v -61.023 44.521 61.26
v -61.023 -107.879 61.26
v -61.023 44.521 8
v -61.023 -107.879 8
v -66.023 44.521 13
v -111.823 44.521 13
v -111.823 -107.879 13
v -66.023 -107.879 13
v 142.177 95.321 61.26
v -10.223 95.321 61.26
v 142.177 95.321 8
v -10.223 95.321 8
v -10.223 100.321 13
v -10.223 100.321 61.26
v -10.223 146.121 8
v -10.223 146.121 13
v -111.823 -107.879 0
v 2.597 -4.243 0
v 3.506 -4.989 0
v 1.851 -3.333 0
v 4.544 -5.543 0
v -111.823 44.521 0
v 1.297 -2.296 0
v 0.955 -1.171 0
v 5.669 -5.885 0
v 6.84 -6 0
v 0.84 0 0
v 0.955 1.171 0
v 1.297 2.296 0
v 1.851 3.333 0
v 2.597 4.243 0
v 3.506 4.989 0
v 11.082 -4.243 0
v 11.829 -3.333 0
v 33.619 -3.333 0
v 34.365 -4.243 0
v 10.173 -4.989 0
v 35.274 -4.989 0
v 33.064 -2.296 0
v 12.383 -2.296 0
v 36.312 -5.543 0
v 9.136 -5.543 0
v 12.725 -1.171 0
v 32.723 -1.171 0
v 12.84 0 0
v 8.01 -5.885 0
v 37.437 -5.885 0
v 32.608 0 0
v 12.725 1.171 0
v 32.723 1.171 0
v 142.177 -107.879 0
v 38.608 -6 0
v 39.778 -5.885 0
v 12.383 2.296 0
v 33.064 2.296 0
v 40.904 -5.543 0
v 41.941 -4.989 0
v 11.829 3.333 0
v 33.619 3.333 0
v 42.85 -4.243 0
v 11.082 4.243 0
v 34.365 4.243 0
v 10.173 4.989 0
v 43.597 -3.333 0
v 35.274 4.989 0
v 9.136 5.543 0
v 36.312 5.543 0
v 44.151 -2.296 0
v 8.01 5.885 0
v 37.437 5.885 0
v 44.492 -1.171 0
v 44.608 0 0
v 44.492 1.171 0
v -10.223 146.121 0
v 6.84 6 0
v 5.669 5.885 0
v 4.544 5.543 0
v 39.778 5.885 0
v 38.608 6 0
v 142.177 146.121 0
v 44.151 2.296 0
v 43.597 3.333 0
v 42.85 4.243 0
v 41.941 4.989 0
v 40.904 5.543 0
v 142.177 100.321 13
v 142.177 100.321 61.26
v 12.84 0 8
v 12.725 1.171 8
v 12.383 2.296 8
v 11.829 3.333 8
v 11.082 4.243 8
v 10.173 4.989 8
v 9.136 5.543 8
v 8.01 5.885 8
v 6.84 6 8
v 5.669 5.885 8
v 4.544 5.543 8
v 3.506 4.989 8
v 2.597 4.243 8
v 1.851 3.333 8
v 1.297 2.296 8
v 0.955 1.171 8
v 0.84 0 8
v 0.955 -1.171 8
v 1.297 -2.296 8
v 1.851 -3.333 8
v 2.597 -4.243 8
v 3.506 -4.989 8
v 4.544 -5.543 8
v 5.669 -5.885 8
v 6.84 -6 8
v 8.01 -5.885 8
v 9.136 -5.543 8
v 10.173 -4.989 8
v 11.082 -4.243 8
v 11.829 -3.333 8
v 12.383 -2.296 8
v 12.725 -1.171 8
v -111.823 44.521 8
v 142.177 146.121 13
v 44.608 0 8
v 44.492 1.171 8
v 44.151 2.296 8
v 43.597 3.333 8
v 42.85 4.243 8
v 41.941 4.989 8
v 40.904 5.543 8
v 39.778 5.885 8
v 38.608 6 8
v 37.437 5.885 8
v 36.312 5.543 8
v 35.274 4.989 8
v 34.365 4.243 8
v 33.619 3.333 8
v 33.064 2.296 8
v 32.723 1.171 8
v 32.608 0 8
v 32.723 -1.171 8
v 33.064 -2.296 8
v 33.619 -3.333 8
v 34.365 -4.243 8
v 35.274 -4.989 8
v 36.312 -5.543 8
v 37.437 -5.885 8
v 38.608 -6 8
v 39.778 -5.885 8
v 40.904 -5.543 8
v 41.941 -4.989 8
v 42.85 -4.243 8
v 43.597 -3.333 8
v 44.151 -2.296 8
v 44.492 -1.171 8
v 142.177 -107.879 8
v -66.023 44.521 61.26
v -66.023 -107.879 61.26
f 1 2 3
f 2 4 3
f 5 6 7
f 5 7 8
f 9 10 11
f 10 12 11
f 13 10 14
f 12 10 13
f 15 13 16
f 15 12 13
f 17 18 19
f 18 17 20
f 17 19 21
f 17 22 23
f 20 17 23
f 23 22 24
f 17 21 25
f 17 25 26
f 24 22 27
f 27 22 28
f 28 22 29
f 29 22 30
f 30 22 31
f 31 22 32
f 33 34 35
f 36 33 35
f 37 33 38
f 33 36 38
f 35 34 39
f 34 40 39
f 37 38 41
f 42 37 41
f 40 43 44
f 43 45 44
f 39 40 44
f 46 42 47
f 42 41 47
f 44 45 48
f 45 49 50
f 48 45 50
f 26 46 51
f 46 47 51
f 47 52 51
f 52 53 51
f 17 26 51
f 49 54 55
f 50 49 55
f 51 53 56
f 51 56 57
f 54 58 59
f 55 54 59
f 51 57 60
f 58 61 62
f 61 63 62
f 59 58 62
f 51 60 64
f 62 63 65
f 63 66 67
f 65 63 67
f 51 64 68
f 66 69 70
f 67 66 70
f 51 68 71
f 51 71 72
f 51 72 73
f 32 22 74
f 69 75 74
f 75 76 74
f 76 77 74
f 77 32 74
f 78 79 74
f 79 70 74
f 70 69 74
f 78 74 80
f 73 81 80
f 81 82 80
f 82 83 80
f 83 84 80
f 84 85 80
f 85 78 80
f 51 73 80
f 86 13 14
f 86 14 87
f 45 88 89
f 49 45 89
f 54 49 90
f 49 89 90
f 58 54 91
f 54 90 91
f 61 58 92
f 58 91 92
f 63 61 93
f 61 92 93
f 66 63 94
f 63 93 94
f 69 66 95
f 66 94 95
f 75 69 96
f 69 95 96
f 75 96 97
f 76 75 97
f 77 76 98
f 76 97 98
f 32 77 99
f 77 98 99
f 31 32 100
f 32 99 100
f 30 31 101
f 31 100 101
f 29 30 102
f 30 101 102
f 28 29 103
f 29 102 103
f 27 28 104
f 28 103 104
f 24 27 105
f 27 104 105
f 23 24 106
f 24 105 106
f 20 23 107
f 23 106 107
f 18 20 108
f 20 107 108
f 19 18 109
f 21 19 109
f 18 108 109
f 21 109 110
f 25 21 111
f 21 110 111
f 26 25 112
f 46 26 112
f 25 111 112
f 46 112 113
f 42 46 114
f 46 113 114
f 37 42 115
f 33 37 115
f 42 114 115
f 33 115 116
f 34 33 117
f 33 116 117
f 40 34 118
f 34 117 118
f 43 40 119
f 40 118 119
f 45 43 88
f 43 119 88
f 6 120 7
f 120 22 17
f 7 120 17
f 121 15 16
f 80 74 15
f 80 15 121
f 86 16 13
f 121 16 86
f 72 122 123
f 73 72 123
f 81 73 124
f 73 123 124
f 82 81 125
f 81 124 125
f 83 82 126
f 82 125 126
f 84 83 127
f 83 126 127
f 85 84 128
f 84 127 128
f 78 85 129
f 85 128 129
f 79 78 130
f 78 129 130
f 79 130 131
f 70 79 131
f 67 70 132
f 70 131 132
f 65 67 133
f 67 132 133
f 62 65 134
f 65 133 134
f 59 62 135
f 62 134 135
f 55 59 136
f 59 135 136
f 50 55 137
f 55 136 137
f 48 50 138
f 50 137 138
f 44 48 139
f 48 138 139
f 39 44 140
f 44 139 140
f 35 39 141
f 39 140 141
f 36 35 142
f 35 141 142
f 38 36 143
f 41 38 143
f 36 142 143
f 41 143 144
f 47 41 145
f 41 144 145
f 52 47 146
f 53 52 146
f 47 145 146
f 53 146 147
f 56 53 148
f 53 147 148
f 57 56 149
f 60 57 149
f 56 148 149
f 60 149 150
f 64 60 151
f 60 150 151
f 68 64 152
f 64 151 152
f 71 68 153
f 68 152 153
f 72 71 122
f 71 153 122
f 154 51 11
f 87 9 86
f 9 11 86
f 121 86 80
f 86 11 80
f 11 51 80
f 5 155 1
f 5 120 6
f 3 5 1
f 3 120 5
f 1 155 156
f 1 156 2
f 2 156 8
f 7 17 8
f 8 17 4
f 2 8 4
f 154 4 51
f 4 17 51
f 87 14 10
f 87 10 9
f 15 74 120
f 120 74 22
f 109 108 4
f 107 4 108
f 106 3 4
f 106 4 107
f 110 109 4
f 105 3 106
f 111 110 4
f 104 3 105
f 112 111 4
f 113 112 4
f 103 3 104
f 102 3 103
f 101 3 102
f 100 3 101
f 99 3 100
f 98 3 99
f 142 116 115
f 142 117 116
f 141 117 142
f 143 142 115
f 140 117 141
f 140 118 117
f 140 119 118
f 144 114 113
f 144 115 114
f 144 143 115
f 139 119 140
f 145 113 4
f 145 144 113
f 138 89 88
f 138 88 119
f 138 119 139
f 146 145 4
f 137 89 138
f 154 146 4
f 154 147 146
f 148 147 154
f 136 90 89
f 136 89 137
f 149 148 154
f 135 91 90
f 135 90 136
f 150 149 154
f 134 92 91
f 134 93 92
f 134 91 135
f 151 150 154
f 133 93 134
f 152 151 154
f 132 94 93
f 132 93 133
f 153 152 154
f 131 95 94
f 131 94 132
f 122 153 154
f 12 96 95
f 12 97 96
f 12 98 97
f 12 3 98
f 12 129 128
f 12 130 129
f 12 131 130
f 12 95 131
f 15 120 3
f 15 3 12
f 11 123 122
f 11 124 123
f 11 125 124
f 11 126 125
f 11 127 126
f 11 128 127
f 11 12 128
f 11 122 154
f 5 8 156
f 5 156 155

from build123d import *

# Parameters (mm, degrees)
F1_DEPTH  = 8
F2_W      = 152.4
F2_H      = 50.8
F2_W_2    = 50.8
F2_H_2    = 152.4
F3_DEPTH  = 5
F5_W      = 152.4
F5_H      = 5
F6_DEPTH  = 48.26
F7_R      = 6
F8_DEPTH  = 8
F9_R      = 6
F10_DEPTH = 8
F4_W      = 5
F4_H      = 152.4
F11_DEPTH = 48.26


with BuildPart() as f1:
    # F0 (on Top) → F1 (new body)
    with BuildSketch(Plane.XY):
        Polygon((-10.222614, 146.12082), (-111.822614, 44.52082), (-111.822614, -107.87918), (142.177386, -107.87918), (142.177386, 146.12082), align=None)
    extrude(amount=F1_DEPTH)

    # F2 (on face) → F3 (join)
    with BuildSketch(Plane.XY.offset(8)):
        with Locations((65.977386, 120.72082)):
            Rectangle(F2_W, F2_H)
        with Locations((-86.422614, -31.67918)):
            Rectangle(F2_W_2, F2_H_2)
    extrude(amount=F3_DEPTH)

    # F5 (on face) → F6 (join)
    with BuildSketch(Plane.XY.offset(13)):
        with Locations((65.977386, 97.82082)):
            Rectangle(F5_W, F5_H)
    extrude(amount=F6_DEPTH)

    # F7 (on face) → F8 (cut)
    with BuildSketch(Plane.XY.offset(8)):
        with Locations((6.839792, 0)):
            Circle(F7_R)
    extrude(amount=-F8_DEPTH, mode=Mode.SUBTRACT)

    # F9 (on face) → F10 (cut)
    with BuildSketch(Plane.XY.offset(8)):
        with Locations((38.607758, 0)):
            Circle(F9_R)
    extrude(amount=-F10_DEPTH, mode=Mode.SUBTRACT)

    # F4 (on face) → F11 (join)
    with BuildSketch(Plane.XY.offset(13)):
        with Locations((-63.522614, -31.67918)):
            Rectangle(F4_W, F4_H)
    extrude(amount=F11_DEPTH)


solid = f1.part
